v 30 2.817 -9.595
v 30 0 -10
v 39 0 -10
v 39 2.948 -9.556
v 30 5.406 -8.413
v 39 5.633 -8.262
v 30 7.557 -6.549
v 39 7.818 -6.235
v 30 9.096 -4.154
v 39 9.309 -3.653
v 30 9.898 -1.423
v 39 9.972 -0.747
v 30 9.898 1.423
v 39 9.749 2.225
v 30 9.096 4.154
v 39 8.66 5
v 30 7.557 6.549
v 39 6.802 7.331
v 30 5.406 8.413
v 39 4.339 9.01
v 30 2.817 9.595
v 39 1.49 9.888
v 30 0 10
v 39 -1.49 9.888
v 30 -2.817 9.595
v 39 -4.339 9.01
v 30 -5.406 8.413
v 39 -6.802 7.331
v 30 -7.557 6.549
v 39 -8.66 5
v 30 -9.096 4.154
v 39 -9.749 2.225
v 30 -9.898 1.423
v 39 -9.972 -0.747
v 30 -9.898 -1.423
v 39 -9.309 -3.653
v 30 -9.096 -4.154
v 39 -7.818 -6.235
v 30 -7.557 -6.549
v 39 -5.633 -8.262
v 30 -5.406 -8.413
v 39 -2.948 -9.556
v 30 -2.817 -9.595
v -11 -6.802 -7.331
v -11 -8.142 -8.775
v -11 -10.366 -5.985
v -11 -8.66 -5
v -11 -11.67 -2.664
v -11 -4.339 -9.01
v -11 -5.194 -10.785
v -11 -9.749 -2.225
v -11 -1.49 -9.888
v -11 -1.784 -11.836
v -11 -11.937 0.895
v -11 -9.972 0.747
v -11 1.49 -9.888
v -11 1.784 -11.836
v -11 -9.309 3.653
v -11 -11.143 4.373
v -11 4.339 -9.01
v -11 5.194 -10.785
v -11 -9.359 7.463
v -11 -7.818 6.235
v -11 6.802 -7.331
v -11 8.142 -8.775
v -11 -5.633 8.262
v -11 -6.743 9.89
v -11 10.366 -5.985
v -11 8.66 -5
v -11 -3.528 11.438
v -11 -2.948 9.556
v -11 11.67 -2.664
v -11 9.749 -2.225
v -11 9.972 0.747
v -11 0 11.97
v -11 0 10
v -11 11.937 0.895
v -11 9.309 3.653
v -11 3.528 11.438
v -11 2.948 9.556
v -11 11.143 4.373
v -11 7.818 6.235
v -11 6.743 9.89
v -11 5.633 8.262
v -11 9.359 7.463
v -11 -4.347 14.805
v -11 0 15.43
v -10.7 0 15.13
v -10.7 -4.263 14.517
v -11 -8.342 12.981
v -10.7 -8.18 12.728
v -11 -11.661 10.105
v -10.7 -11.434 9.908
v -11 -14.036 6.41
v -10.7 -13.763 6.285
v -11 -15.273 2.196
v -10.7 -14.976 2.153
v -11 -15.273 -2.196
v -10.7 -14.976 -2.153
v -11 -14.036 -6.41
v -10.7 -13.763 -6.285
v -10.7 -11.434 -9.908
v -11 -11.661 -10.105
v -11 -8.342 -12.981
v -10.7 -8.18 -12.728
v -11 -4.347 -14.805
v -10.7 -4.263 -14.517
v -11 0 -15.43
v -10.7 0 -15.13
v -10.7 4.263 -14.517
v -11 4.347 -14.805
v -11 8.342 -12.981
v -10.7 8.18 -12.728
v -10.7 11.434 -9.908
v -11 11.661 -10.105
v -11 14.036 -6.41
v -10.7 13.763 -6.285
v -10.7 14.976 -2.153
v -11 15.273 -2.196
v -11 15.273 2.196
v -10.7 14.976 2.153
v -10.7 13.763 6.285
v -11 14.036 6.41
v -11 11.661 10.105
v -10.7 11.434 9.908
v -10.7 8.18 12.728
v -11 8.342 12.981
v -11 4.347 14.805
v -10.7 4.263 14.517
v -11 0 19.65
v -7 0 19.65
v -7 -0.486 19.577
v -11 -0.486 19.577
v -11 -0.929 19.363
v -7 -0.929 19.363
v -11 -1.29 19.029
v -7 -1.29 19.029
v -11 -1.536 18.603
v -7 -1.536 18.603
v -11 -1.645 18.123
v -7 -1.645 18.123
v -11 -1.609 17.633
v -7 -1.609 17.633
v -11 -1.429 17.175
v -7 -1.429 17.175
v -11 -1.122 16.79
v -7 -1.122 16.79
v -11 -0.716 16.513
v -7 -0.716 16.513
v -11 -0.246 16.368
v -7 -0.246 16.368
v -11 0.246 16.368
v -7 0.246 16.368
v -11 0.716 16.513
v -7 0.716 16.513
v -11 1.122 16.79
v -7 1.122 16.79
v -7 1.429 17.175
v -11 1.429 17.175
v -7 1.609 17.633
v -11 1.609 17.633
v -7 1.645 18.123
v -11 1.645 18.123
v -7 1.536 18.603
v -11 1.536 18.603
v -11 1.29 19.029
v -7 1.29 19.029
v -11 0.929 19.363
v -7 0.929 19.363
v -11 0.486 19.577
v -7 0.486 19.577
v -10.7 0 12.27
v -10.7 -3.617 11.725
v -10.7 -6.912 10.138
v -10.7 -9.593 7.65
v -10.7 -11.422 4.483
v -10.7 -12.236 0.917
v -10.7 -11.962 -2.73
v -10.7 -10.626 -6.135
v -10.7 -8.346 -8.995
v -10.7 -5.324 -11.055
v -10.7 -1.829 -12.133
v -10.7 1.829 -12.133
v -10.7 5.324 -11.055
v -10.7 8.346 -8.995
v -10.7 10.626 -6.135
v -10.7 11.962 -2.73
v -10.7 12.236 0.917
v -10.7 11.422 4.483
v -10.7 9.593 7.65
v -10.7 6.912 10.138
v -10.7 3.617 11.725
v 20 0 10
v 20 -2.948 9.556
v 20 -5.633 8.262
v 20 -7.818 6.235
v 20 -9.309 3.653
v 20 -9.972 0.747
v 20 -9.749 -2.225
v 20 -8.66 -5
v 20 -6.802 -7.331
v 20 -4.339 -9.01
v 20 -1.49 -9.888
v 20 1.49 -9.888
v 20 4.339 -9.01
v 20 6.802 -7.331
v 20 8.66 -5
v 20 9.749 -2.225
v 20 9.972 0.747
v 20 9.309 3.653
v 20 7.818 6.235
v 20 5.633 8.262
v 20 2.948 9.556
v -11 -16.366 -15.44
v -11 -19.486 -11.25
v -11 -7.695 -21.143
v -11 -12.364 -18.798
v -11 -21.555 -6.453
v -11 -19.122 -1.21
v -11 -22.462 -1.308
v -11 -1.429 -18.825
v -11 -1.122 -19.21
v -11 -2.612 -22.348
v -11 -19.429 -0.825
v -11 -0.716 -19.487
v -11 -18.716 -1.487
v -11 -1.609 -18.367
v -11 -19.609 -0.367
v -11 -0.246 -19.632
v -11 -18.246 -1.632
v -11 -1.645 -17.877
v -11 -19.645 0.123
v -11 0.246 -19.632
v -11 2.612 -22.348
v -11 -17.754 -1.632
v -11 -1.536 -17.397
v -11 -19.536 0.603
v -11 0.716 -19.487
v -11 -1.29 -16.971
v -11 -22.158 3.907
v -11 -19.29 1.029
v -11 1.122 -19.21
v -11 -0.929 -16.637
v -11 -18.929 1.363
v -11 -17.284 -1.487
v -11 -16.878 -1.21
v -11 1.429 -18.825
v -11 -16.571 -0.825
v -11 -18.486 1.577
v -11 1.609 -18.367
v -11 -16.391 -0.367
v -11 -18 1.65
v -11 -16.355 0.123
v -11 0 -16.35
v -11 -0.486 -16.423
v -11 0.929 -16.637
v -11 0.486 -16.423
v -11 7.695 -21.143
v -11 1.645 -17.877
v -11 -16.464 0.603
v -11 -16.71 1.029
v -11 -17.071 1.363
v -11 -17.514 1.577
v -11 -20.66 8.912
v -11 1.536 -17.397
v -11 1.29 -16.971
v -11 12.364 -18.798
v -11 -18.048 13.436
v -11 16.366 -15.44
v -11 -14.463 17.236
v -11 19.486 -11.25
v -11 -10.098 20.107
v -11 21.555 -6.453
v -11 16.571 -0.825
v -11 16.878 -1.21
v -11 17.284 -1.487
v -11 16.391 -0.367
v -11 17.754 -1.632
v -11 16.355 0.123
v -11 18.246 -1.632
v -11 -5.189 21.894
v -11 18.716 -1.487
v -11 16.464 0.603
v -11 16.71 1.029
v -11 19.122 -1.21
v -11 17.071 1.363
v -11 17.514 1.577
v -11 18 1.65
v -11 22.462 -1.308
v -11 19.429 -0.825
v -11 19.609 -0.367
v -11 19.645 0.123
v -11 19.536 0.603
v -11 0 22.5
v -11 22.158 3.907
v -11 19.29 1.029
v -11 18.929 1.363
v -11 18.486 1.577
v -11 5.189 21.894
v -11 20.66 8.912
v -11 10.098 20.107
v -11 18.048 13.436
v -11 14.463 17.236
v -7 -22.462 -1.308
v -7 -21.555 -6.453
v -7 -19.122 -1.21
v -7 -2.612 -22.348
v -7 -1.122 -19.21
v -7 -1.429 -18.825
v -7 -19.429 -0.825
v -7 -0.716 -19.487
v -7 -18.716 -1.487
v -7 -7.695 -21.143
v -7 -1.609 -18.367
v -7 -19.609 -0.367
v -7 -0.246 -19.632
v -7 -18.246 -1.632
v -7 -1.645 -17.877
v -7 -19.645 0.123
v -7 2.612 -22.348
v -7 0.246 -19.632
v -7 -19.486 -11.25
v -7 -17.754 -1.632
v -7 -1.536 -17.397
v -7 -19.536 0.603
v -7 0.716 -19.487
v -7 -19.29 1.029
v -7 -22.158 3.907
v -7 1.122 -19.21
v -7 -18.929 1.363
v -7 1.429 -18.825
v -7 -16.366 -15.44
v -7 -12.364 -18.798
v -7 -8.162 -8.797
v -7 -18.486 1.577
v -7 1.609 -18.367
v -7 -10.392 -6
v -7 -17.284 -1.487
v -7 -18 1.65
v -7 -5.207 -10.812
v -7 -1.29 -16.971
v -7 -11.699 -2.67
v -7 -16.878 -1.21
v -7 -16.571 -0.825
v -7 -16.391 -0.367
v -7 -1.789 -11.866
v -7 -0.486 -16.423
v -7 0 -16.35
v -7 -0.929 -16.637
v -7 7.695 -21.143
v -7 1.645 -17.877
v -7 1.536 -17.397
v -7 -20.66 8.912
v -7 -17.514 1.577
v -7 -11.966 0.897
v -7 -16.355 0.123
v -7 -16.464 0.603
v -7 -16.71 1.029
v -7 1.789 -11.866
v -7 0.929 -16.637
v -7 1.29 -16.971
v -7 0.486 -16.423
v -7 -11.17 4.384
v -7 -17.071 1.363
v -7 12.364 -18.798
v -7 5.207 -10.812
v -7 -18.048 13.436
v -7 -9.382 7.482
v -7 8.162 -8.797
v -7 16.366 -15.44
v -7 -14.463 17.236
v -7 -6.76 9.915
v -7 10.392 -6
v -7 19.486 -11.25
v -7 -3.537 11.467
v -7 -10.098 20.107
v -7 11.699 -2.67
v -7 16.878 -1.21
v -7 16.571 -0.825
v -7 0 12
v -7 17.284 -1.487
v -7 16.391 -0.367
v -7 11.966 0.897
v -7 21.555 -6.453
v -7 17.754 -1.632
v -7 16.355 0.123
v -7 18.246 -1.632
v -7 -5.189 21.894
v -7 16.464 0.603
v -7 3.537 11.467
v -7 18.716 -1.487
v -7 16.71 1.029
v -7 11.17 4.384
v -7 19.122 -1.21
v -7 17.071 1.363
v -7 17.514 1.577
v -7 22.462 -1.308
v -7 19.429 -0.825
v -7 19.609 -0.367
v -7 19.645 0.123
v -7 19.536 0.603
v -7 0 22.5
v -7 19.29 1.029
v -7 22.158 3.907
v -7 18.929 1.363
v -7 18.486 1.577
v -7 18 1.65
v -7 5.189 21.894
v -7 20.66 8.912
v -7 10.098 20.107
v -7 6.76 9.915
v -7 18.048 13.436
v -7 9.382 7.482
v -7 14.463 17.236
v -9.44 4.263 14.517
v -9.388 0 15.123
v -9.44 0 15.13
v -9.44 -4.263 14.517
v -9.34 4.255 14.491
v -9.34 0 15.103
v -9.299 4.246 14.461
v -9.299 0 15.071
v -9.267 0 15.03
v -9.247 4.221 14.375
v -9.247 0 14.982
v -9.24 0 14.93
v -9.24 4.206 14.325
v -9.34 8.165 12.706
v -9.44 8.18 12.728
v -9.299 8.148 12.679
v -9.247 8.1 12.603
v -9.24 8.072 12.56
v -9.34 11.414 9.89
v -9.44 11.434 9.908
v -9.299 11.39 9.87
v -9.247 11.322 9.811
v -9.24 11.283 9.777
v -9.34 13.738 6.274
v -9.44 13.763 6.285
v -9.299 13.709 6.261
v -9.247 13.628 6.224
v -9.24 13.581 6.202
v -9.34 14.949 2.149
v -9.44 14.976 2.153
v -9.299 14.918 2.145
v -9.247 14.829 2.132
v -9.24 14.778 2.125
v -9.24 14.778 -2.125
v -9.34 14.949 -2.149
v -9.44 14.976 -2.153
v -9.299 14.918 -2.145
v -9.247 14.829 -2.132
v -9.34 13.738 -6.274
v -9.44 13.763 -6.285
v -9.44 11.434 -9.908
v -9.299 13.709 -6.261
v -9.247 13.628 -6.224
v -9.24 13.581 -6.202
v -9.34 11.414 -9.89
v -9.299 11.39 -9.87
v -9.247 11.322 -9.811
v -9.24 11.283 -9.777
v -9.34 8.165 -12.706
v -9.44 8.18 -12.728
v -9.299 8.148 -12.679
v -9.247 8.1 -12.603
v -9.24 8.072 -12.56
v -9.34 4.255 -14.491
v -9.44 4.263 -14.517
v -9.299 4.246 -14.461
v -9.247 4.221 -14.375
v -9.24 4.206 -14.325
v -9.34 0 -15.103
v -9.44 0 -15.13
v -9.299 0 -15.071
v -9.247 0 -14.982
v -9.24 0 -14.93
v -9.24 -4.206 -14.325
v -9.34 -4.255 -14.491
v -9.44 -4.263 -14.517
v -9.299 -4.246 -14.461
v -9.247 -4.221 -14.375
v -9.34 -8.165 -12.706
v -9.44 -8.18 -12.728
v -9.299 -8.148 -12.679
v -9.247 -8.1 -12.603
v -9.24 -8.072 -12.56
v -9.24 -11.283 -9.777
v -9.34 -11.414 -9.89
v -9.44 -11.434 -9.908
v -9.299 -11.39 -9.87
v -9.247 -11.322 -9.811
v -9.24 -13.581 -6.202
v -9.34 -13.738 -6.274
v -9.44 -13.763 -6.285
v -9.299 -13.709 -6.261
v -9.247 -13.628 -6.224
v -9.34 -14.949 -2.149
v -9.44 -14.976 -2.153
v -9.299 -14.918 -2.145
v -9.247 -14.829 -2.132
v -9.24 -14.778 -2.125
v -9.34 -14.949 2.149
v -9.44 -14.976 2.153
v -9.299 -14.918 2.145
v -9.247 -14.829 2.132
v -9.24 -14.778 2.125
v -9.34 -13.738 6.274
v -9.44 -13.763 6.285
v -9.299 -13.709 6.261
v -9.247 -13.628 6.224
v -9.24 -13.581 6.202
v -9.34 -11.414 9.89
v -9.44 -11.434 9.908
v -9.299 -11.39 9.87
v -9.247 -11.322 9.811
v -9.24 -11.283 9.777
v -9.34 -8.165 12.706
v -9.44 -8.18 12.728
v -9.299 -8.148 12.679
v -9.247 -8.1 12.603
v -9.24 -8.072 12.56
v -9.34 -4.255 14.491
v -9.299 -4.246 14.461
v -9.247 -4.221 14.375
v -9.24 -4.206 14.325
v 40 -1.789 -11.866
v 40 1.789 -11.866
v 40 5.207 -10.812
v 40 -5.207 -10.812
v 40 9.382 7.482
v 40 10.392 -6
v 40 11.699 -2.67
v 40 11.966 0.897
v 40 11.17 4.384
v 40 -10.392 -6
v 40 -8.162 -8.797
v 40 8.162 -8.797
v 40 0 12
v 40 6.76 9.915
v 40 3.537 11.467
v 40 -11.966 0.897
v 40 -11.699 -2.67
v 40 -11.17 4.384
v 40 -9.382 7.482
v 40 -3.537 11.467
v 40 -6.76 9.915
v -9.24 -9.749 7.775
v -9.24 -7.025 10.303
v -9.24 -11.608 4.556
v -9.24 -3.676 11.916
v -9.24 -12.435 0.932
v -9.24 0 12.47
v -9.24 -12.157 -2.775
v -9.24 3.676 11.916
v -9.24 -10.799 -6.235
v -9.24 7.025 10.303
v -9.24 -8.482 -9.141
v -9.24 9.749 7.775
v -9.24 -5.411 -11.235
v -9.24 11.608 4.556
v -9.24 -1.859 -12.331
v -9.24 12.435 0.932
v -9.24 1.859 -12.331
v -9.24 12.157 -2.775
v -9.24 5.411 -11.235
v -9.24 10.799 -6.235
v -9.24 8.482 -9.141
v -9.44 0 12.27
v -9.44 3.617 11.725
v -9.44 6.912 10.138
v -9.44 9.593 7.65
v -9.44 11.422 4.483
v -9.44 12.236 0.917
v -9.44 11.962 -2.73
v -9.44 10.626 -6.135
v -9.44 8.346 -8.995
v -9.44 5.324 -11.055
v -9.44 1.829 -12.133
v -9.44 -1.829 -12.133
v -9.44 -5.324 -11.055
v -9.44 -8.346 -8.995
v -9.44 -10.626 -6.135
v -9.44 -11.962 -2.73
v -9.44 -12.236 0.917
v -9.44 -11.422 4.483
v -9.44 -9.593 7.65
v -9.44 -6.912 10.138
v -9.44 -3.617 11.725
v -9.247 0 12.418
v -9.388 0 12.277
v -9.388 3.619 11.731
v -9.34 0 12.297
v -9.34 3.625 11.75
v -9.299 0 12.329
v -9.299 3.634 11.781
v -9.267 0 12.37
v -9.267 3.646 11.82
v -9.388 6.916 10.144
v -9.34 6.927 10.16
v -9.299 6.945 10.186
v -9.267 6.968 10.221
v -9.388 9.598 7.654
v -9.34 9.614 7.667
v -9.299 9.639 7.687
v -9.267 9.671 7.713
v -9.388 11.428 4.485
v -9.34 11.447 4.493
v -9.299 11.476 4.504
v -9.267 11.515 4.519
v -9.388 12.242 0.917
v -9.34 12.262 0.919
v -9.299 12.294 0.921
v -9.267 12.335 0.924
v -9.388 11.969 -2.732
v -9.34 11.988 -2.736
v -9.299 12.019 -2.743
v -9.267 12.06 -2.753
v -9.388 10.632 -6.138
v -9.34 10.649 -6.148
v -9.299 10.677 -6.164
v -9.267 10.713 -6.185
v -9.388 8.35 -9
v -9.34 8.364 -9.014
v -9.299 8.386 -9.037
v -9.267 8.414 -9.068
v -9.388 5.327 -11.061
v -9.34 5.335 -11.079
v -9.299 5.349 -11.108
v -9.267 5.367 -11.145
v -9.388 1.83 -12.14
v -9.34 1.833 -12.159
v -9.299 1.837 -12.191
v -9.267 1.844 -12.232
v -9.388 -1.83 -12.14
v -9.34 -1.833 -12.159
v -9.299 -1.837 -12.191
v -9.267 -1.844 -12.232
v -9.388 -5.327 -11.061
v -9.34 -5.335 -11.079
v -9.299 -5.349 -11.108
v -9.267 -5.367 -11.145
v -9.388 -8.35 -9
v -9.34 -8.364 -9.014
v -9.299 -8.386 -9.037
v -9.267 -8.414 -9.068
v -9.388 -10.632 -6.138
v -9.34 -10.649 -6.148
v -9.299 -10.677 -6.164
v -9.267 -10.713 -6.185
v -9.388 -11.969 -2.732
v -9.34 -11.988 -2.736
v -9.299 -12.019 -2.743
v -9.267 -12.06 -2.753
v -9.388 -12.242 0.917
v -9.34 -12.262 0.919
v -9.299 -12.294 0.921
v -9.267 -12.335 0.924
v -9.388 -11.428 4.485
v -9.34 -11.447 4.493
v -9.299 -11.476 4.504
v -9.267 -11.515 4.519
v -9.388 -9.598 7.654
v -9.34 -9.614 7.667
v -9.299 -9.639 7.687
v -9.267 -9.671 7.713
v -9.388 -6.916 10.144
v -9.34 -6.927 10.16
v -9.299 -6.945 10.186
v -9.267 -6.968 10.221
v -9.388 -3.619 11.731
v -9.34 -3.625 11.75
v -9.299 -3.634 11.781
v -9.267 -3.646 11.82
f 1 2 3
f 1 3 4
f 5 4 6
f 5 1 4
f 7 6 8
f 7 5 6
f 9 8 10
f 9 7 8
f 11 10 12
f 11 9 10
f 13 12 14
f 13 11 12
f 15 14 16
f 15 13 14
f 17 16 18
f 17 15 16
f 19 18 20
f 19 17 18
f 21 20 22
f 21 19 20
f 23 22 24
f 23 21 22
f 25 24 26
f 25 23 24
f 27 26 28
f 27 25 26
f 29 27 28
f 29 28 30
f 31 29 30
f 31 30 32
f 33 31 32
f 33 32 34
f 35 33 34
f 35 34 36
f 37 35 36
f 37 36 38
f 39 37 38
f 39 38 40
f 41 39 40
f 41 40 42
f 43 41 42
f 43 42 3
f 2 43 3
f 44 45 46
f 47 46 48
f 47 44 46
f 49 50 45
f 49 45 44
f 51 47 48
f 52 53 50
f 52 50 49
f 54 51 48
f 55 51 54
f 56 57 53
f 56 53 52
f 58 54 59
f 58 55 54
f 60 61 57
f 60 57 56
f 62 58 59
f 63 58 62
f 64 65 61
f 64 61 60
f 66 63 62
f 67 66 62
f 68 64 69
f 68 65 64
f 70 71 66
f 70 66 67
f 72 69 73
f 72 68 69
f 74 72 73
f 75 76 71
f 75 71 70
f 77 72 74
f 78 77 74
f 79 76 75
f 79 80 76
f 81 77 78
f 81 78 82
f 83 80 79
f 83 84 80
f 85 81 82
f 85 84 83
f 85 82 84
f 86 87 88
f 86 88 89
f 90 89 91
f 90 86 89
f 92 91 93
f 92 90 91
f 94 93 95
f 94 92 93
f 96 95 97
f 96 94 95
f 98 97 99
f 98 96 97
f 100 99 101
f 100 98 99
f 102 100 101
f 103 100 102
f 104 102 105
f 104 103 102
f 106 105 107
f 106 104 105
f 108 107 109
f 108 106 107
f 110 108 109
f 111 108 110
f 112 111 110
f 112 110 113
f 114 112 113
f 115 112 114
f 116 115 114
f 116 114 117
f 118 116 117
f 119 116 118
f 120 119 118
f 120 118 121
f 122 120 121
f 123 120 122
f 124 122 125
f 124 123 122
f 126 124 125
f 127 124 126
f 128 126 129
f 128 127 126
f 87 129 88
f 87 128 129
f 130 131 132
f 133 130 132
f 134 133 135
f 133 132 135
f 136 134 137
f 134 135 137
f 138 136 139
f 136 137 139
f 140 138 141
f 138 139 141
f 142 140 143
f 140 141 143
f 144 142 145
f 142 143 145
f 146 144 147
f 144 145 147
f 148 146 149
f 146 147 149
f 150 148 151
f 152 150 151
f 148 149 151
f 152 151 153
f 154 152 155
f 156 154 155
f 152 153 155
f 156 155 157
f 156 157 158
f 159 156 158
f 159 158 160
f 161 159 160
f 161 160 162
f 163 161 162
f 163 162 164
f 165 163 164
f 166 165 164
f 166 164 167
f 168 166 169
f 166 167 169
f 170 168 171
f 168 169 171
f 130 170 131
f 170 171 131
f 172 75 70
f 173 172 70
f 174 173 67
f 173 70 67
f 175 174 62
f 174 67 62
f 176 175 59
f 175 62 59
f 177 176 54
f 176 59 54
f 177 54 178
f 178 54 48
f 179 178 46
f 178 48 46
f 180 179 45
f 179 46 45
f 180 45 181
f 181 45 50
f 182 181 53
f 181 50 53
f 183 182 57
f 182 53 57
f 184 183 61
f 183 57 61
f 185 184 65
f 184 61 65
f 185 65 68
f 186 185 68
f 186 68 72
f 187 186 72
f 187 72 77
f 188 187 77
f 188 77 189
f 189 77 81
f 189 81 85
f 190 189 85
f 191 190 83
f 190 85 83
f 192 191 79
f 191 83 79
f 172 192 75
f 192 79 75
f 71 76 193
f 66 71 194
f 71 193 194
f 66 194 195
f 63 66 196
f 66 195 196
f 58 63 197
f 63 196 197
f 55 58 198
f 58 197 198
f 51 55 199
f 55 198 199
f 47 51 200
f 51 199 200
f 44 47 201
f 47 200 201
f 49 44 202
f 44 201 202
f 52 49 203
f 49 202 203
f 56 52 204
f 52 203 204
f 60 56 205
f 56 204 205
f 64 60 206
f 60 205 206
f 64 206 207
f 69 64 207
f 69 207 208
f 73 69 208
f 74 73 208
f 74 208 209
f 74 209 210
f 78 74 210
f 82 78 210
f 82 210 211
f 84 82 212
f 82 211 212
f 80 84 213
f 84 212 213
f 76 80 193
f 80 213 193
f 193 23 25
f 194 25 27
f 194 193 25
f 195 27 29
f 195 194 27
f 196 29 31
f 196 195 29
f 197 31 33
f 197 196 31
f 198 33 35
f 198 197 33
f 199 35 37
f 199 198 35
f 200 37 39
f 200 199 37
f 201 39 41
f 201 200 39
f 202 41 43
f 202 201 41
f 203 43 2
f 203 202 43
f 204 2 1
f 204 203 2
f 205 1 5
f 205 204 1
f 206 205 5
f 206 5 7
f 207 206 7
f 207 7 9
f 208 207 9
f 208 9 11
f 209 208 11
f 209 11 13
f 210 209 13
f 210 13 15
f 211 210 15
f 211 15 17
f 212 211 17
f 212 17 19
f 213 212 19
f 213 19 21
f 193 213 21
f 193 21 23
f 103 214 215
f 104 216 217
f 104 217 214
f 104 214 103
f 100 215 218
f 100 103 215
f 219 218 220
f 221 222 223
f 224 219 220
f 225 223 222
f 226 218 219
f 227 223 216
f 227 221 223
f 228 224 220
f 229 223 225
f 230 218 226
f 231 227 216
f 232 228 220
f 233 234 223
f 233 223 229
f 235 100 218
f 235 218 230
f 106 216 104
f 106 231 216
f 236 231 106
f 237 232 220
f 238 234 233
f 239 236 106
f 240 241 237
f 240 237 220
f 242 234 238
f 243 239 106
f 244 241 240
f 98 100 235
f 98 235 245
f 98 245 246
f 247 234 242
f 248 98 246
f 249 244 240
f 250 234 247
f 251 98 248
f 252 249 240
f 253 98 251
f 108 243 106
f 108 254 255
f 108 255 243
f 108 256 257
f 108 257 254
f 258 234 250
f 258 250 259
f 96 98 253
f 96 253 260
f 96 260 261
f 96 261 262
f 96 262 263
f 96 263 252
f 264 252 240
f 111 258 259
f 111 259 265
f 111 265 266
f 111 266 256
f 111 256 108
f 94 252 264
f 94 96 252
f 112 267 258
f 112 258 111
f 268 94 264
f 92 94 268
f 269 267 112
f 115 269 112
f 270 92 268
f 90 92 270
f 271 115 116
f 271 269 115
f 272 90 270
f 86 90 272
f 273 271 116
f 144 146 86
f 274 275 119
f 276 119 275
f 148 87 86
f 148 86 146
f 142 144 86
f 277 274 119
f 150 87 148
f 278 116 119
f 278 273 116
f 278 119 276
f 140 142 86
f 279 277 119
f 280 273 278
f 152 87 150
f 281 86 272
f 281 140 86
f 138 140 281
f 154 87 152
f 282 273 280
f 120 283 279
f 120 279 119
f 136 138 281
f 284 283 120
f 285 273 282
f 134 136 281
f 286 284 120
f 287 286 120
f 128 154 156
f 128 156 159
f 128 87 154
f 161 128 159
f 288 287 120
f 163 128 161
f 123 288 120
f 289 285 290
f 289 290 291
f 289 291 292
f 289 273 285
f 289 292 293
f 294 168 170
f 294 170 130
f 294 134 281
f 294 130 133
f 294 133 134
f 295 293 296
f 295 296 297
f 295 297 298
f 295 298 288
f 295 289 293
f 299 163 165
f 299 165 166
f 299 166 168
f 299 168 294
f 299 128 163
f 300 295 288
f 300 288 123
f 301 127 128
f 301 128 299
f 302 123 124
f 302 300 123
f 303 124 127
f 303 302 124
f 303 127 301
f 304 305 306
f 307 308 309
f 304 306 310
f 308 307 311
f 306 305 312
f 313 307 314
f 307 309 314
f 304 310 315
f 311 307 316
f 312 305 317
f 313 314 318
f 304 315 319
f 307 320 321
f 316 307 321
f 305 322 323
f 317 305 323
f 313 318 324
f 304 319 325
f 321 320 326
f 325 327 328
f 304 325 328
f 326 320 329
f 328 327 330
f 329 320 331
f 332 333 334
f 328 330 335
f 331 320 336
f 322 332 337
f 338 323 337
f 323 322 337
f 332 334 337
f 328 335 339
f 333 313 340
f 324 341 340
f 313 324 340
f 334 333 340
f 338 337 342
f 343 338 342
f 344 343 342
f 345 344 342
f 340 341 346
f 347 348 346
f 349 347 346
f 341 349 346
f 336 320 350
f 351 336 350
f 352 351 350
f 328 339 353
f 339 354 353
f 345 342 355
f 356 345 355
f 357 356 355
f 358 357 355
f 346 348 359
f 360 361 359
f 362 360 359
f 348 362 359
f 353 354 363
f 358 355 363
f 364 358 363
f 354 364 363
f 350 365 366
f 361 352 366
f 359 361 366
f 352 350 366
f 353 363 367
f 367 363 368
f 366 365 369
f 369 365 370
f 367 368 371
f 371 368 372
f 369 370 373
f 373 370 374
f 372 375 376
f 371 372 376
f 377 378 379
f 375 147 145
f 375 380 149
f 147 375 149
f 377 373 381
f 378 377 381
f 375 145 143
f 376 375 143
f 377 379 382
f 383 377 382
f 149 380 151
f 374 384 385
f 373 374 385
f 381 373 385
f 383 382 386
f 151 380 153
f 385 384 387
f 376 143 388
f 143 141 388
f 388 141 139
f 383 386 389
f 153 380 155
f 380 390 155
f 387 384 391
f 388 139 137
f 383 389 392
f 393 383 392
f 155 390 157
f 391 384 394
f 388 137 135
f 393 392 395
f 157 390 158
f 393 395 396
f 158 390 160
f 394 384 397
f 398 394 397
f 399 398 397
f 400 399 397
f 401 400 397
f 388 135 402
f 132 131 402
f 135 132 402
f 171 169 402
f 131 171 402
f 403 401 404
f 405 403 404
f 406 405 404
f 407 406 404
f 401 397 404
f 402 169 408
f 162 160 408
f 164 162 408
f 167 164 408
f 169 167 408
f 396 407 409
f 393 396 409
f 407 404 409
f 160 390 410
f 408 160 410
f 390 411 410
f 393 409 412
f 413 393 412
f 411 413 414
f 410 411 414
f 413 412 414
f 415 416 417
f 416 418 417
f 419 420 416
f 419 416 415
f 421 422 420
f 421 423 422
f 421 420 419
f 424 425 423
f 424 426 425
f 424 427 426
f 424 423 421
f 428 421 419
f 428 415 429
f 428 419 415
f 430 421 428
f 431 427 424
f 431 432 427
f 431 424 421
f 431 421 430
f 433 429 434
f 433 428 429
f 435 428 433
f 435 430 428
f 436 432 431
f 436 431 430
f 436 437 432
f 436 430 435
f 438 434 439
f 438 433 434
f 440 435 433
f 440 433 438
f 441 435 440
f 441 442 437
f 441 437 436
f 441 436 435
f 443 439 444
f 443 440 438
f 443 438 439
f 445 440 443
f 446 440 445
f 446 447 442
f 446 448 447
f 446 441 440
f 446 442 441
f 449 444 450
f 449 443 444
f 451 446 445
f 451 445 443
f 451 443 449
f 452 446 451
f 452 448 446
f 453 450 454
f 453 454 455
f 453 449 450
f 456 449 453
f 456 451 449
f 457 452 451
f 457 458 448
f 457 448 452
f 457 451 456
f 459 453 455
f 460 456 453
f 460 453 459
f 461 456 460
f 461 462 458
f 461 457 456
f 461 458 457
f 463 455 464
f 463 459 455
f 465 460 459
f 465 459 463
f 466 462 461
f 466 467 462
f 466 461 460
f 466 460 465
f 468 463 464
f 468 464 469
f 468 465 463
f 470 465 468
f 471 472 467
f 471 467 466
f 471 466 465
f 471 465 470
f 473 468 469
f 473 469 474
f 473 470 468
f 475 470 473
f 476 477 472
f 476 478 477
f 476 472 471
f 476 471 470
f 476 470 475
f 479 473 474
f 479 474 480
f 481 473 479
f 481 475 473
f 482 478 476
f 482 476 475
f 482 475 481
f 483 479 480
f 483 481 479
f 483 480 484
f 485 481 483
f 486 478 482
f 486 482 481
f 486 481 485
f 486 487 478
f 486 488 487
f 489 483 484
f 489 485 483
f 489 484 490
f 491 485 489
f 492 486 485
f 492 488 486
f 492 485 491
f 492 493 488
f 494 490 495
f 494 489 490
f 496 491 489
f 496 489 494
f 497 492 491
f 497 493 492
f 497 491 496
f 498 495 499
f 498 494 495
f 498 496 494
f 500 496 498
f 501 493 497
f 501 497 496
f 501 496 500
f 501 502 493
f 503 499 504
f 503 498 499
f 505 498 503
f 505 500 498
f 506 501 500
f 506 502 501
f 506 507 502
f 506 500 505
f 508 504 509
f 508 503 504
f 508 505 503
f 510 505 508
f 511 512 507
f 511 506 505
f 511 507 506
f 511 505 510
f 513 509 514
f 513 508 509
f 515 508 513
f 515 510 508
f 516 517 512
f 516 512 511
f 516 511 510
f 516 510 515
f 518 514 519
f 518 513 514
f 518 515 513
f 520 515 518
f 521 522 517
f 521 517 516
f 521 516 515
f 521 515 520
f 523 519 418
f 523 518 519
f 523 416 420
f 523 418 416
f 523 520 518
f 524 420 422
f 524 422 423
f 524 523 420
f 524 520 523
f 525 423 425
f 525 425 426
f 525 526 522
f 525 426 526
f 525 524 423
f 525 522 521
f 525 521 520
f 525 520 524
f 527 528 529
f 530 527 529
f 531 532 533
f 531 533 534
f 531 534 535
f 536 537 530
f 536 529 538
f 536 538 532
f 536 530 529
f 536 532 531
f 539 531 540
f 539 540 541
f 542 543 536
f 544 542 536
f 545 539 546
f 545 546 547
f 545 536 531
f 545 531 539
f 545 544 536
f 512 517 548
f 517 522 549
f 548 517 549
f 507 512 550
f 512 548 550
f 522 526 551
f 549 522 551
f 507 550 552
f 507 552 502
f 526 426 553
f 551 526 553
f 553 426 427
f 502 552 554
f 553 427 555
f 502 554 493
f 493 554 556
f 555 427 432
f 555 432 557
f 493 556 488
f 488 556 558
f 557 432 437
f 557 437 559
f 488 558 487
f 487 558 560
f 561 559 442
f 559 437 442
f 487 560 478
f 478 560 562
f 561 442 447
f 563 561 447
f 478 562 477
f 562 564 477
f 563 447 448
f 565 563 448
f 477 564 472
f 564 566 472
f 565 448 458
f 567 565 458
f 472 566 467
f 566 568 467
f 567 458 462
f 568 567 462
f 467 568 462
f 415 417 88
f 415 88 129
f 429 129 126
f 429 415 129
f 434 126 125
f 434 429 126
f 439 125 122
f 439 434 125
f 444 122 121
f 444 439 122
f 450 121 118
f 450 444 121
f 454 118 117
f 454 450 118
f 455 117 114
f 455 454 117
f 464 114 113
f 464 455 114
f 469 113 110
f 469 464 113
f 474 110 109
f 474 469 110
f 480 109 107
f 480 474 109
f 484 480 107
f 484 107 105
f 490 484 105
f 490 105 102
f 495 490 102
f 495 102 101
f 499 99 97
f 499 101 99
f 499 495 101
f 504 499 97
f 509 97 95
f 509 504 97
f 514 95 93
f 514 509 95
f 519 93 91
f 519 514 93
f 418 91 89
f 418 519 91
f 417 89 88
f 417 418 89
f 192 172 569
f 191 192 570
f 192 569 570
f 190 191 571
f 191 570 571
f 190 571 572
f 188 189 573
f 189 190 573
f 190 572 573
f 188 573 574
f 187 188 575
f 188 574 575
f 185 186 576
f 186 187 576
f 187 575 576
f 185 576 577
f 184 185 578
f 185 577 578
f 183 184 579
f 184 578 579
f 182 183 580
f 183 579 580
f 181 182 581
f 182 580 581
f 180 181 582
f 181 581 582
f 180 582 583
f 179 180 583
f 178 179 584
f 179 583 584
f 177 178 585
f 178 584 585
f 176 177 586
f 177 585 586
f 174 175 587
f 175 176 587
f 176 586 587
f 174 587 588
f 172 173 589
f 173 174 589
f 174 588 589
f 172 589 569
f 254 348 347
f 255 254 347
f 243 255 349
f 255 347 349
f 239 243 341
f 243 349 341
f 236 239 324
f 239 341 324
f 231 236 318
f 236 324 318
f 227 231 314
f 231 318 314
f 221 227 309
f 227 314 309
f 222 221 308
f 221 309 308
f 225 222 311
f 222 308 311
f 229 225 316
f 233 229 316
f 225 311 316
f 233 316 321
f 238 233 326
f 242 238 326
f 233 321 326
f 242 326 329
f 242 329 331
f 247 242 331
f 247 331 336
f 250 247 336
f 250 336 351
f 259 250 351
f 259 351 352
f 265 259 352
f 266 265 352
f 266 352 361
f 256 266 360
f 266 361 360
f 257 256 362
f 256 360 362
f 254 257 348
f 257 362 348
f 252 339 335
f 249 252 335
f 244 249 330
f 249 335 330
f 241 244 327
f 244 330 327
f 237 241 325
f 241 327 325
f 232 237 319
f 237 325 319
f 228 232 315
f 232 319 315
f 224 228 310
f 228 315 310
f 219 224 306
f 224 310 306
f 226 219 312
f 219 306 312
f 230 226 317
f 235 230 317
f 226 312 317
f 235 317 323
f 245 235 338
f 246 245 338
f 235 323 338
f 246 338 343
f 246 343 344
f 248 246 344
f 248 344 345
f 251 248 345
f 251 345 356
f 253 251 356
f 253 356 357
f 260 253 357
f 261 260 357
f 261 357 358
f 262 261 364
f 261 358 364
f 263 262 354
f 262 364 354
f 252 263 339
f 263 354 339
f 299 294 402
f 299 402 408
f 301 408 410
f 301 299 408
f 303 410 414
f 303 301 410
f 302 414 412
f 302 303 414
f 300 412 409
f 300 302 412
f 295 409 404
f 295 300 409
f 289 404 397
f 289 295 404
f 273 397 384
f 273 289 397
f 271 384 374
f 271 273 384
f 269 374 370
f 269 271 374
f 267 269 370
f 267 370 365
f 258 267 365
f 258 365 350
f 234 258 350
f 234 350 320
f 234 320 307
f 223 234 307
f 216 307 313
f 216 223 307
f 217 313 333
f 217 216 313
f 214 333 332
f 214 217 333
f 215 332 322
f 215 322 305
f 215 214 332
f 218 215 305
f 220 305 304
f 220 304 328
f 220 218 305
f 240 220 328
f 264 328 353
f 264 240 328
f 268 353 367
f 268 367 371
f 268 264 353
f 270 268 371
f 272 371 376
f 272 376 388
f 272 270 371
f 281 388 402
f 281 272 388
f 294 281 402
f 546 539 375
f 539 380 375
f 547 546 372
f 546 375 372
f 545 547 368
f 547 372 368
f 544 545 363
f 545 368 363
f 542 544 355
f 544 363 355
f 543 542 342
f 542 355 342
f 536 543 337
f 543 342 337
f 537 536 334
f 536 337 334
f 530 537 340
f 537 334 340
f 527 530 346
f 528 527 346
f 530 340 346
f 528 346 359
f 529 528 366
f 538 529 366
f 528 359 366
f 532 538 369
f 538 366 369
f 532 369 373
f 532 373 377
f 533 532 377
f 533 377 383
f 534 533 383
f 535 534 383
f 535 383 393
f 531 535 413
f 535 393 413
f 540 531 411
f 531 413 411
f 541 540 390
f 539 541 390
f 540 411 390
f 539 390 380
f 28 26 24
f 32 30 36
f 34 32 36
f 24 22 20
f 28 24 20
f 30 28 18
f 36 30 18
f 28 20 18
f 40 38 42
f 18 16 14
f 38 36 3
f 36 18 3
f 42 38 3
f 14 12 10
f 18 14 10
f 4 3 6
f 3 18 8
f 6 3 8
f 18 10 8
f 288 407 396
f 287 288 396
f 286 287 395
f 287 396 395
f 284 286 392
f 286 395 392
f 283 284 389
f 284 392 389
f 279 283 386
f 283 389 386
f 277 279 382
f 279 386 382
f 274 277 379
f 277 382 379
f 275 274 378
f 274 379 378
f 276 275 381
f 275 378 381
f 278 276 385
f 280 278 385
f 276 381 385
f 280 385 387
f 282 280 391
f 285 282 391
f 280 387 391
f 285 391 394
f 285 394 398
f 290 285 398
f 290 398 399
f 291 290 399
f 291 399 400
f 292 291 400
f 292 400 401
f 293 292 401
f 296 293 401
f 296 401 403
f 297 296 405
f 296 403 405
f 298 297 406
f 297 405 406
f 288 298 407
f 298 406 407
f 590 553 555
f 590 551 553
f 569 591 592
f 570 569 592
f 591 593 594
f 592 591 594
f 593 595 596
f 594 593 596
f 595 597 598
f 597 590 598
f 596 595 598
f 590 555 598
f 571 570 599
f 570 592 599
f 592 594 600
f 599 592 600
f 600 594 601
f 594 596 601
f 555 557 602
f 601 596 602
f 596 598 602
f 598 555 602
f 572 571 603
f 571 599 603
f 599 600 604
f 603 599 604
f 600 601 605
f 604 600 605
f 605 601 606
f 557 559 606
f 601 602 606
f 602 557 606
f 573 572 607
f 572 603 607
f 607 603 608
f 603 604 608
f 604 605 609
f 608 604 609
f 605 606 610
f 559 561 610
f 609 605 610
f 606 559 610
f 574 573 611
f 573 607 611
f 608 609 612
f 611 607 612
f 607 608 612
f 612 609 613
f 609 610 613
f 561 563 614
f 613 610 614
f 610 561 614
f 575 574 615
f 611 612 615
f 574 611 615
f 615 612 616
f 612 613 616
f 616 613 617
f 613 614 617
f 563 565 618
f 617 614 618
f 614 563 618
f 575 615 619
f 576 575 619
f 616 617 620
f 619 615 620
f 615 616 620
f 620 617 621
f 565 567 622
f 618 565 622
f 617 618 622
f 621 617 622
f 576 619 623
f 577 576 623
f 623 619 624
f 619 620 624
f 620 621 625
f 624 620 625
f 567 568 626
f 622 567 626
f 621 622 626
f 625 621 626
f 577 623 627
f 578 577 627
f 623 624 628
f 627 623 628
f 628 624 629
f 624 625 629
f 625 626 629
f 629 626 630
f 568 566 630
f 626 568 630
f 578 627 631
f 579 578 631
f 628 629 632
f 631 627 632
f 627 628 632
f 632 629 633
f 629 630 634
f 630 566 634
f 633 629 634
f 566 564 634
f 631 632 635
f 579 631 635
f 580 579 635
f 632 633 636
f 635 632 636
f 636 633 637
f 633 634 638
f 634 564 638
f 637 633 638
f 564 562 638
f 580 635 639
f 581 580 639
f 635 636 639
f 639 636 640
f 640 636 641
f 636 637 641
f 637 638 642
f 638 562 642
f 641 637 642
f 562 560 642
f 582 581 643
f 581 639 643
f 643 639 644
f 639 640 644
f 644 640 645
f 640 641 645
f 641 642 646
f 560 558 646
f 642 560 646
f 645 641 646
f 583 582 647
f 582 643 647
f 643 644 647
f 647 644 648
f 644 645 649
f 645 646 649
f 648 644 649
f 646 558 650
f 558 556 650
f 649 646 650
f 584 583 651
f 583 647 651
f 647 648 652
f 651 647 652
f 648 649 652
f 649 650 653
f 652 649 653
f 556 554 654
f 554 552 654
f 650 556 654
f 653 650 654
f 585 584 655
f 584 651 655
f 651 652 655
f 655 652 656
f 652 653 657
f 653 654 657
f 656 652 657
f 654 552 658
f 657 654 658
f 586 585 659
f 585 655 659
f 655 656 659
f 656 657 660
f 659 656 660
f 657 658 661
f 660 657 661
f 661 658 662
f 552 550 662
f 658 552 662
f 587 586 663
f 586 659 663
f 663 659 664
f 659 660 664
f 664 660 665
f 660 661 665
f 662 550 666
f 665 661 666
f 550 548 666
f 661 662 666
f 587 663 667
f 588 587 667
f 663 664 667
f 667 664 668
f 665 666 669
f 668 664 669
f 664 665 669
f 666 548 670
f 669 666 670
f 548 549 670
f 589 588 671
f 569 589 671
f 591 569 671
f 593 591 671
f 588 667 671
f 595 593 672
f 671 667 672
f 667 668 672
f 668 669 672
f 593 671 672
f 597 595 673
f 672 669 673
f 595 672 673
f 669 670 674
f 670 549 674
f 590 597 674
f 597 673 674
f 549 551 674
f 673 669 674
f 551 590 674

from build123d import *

# Parameters (mm, degrees)
SKETCH_1_W                  = 31
SKETCH_1_H                  = 2
SKETCH_6_R                  = 22.5
SKETCH_6_R_2                = 12
EXTRUDE_1_DEPTH             = 4
SKETCH_8_R                  = 12
SKETCH_8_R_2                = 10
EXTRUDE_3_DEPTH             = 10
SKETCH_9_R                  = 12
EXTRUDE_5_DEPTH             = 10
SKETCH_18_R                 = 10
CUT_EXTRUDE_1_DEPTH         = 46
SKETCH_17_W                 = 1.65
SKETCH_17_H                 = 51
HOLE_WIZARD_M4_1_AT_2_COUNT = 2
HOLE_WIZARD_M4_1_AT_2_PITCH = 25.455844123
HOLE_WIZARD_M4_1_AT_3_COUNT = 2
HOLE_WIZARD_M4_1_AT_3_PITCH = 36
HOLE_WIZARD_M4_1_AT_4_COUNT = 2
HOLE_WIZARD_M4_1_AT_4_PITCH = 25.455844123
SKETCH_12_W                 = 1
SKETCH_12_H                 = 2
CUT_EXTRUDE_START           = -10
SKETCH_19_R                 = 12
SKETCH_19_R_2               = 11
CUT_EXTRUDE_3_DEPTH         = 10
SKETCH_20_W                 = 2.76
SKETCH_20_H                 = 2.86
FILLET_1_R                  = 0.2
CHAMFER_1_SIZE              = 0.3
CHAMFER_2_SIZE              = 0.3
SKETCH_21_R                 = 12
SKETCH_21_R_2               = 11
EXTRUDE_6_DEPTH             = 10


with BuildPart() as part:
    # 草图1 → 旋转1 (revolve)
    with BuildSketch(Plane.XY, mode=Mode.PRIVATE) as revolve_1_sk:
        with Locations((4.5, 11)):
            Rectangle(SKETCH_1_W, SKETCH_1_H)
    revolve(revolve_1_sk.sketch.rotate(Axis((-11, 0, 0), (1, 0, 0)), 90), axis=Axis((-11, 0, 0), (1, 0, 0)))

    # 草图6 → 凸台-拉伸1 (add)
    with BuildSketch(Plane.ZY.offset(11)):
        Circle(SKETCH_6_R)
        Circle(SKETCH_6_R_2, mode=Mode.SUBTRACT)
    extrude(amount=-EXTRUDE_1_DEPTH)

    # 草图8 → 凸台-拉伸3 (add)
    with BuildSketch(Plane(origin=(20, 0, 0), x_dir=(0, 0, -1), z_dir=(1, 0, 0))):
        with Locations(Location((0, 0, 0), (0, 0, 180))):
            Circle(SKETCH_8_R)
        with Locations(Location((0, 0, 0), (0, 0, 180))):
            Circle(SKETCH_8_R_2, mode=Mode.SUBTRACT)
    extrude(amount=EXTRUDE_3_DEPTH)

    # 草图17 → M4 螺纹孔1 (revolve, cut)
    with BuildSketch(Plane(origin=(-11, 18, 0), x_dir=(0, 0, 1), z_dir=(0, 1, 0))):
        with Locations((0.825, 25.5)):
            Rectangle(SKETCH_17_W, SKETCH_17_H)
    hole_wizard_m4_1 = revolve(axis=Axis((-17.35, 18, 0), (1, 0, 0)), mode=Mode.SUBTRACT)

    # M4 螺纹孔1 at 2: M4 螺纹孔1 ×2
    with Locations(*[Vector(0, -0.7071067811865476, 0.7071067811865476) * (i * HOLE_WIZARD_M4_1_AT_2_PITCH) for i in range(1, HOLE_WIZARD_M4_1_AT_2_COUNT)]):
        add(hole_wizard_m4_1, mode=Mode.SUBTRACT)

    # M4 螺纹孔1 at 3: M4 螺纹孔1 ×2
    with Locations(*[(0, -i * HOLE_WIZARD_M4_1_AT_3_PITCH, 0) for i in range(1, HOLE_WIZARD_M4_1_AT_3_COUNT)]):
        add(hole_wizard_m4_1, mode=Mode.SUBTRACT)

    # M4 螺纹孔1 at 4: M4 螺纹孔1 ×2
    with Locations(*[Vector(0, -0.7071067811865477, -0.7071067811865475) * (i * HOLE_WIZARD_M4_1_AT_4_PITCH) for i in range(1, HOLE_WIZARD_M4_1_AT_4_COUNT)]):
        add(hole_wizard_m4_1, mode=Mode.SUBTRACT)

    # 草图20 → 切除-旋转3 (revolve, cut)
    with BuildSketch(Plane(origin=(0, 0, 0), x_dir=(1, 0, 0), z_dir=(0, 1, 0)), mode=Mode.PRIVATE) as cut_revolve_3_sk:
        with Locations((-10.62, 13.7)):
            Rectangle(SKETCH_20_W, SKETCH_20_H)
    revolve(cut_revolve_3_sk.sketch.rotate(Axis((0, 0, 0), (-1, 0, 0)), 180), axis=Axis((0, 0, 0), (-1, 0, 0)), mode=Mode.SUBTRACT)

    # 圆角1
    fillet_1_edges = [part.edges().sort_by_distance(p)[0] for p in [
        (-9.24, 0, -12.27),
        (-9.24, 0, -15.13),
    ]]
    fillet(fillet_1_edges, radius=FILLET_1_R)

    # 倒角1
    chamfer_1_edges = [part.edges().sort_by_distance(p)[0] for p in [
        (-11, 0, -15.13),
    ]]
    chamfer(chamfer_1_edges, length=CHAMFER_1_SIZE)

    # 倒角2
    chamfer_2_edges = [part.edges().sort_by_distance(p)[0] for p in [
        (-11, 0, -12.27),
    ]]
    chamfer(chamfer_2_edges, length=CHAMFER_2_SIZE)



with BuildPart() as body_2:
    # 草图9 → 凸台-拉伸5 (new body)
    with BuildSketch(Plane(origin=(30, 0, 0), x_dir=(0, 0, -1), z_dir=(1, 0, 0))):
        Circle(SKETCH_9_R)
    extrude(amount=EXTRUDE_5_DEPTH)

    # 草图18 → 切除-拉伸1 (cut)
    with BuildSketch(Plane(origin=(-7, 0, 0), x_dir=(0, 0, -1), z_dir=(1, 0, 0))):
        Circle(SKETCH_18_R)
    extrude(amount=CUT_EXTRUDE_1_DEPTH, mode=Mode.SUBTRACT)

    # 草图12 → 切除-旋转2 (revolve, cut)
    with BuildSketch(Plane.XY, mode=Mode.PRIVATE) as cut_revolve_2_sk:
        with Locations((33.5, -12)):
            Rectangle(SKETCH_12_W, SKETCH_12_H)
        with Locations((31.5, -12)):
            Rectangle(SKETCH_12_W, SKETCH_12_H)
        with Locations((35.5, -12)):
            Rectangle(SKETCH_12_W, SKETCH_12_H)
        with Locations((37.5, -12)):
            Rectangle(SKETCH_12_W, SKETCH_12_H)
        with Locations((39.5, -12)):
            Rectangle(SKETCH_12_W, SKETCH_12_H)
    revolve(cut_revolve_2_sk.sketch.rotate(Axis((0, 0, 0), (1, 0, 0)), 270), axis=Axis((0, 0, 0), (1, 0, 0)), mode=Mode.SUBTRACT)

    # 草图19 → 切除-拉伸3 (cut)
    with BuildSketch(Plane(origin=(40, 0, 0), x_dir=(0, 0, -1), z_dir=(1, 0, 0)).offset(CUT_EXTRUDE_START)):
        with Locations(Location((0, 0, 0), (0, 0, 180))):
            Circle(SKETCH_19_R)
        with Locations(Location((0, 0, 0), (0, 0, 180))):
            Circle(SKETCH_19_R_2, mode=Mode.SUBTRACT)
    extrude(amount=CUT_EXTRUDE_3_DEPTH, mode=Mode.SUBTRACT)


with BuildPart() as part_1:
    add(part.part)

    add(body_2.part)  # 凸台-拉伸6 merges body 2
    # 草图21 → 凸台-拉伸6 (add)
    with BuildSketch(Plane(origin=(30, 0, 0), x_dir=(0, 0, -1), z_dir=(1, 0, 0))):
        with Locations(Location((0, 0, 0), (0, 0, 180))):
            Circle(SKETCH_21_R)
        Circle(SKETCH_21_R_2, mode=Mode.SUBTRACT)
    extrude(amount=EXTRUDE_6_DEPTH)


solid = part_1.part
